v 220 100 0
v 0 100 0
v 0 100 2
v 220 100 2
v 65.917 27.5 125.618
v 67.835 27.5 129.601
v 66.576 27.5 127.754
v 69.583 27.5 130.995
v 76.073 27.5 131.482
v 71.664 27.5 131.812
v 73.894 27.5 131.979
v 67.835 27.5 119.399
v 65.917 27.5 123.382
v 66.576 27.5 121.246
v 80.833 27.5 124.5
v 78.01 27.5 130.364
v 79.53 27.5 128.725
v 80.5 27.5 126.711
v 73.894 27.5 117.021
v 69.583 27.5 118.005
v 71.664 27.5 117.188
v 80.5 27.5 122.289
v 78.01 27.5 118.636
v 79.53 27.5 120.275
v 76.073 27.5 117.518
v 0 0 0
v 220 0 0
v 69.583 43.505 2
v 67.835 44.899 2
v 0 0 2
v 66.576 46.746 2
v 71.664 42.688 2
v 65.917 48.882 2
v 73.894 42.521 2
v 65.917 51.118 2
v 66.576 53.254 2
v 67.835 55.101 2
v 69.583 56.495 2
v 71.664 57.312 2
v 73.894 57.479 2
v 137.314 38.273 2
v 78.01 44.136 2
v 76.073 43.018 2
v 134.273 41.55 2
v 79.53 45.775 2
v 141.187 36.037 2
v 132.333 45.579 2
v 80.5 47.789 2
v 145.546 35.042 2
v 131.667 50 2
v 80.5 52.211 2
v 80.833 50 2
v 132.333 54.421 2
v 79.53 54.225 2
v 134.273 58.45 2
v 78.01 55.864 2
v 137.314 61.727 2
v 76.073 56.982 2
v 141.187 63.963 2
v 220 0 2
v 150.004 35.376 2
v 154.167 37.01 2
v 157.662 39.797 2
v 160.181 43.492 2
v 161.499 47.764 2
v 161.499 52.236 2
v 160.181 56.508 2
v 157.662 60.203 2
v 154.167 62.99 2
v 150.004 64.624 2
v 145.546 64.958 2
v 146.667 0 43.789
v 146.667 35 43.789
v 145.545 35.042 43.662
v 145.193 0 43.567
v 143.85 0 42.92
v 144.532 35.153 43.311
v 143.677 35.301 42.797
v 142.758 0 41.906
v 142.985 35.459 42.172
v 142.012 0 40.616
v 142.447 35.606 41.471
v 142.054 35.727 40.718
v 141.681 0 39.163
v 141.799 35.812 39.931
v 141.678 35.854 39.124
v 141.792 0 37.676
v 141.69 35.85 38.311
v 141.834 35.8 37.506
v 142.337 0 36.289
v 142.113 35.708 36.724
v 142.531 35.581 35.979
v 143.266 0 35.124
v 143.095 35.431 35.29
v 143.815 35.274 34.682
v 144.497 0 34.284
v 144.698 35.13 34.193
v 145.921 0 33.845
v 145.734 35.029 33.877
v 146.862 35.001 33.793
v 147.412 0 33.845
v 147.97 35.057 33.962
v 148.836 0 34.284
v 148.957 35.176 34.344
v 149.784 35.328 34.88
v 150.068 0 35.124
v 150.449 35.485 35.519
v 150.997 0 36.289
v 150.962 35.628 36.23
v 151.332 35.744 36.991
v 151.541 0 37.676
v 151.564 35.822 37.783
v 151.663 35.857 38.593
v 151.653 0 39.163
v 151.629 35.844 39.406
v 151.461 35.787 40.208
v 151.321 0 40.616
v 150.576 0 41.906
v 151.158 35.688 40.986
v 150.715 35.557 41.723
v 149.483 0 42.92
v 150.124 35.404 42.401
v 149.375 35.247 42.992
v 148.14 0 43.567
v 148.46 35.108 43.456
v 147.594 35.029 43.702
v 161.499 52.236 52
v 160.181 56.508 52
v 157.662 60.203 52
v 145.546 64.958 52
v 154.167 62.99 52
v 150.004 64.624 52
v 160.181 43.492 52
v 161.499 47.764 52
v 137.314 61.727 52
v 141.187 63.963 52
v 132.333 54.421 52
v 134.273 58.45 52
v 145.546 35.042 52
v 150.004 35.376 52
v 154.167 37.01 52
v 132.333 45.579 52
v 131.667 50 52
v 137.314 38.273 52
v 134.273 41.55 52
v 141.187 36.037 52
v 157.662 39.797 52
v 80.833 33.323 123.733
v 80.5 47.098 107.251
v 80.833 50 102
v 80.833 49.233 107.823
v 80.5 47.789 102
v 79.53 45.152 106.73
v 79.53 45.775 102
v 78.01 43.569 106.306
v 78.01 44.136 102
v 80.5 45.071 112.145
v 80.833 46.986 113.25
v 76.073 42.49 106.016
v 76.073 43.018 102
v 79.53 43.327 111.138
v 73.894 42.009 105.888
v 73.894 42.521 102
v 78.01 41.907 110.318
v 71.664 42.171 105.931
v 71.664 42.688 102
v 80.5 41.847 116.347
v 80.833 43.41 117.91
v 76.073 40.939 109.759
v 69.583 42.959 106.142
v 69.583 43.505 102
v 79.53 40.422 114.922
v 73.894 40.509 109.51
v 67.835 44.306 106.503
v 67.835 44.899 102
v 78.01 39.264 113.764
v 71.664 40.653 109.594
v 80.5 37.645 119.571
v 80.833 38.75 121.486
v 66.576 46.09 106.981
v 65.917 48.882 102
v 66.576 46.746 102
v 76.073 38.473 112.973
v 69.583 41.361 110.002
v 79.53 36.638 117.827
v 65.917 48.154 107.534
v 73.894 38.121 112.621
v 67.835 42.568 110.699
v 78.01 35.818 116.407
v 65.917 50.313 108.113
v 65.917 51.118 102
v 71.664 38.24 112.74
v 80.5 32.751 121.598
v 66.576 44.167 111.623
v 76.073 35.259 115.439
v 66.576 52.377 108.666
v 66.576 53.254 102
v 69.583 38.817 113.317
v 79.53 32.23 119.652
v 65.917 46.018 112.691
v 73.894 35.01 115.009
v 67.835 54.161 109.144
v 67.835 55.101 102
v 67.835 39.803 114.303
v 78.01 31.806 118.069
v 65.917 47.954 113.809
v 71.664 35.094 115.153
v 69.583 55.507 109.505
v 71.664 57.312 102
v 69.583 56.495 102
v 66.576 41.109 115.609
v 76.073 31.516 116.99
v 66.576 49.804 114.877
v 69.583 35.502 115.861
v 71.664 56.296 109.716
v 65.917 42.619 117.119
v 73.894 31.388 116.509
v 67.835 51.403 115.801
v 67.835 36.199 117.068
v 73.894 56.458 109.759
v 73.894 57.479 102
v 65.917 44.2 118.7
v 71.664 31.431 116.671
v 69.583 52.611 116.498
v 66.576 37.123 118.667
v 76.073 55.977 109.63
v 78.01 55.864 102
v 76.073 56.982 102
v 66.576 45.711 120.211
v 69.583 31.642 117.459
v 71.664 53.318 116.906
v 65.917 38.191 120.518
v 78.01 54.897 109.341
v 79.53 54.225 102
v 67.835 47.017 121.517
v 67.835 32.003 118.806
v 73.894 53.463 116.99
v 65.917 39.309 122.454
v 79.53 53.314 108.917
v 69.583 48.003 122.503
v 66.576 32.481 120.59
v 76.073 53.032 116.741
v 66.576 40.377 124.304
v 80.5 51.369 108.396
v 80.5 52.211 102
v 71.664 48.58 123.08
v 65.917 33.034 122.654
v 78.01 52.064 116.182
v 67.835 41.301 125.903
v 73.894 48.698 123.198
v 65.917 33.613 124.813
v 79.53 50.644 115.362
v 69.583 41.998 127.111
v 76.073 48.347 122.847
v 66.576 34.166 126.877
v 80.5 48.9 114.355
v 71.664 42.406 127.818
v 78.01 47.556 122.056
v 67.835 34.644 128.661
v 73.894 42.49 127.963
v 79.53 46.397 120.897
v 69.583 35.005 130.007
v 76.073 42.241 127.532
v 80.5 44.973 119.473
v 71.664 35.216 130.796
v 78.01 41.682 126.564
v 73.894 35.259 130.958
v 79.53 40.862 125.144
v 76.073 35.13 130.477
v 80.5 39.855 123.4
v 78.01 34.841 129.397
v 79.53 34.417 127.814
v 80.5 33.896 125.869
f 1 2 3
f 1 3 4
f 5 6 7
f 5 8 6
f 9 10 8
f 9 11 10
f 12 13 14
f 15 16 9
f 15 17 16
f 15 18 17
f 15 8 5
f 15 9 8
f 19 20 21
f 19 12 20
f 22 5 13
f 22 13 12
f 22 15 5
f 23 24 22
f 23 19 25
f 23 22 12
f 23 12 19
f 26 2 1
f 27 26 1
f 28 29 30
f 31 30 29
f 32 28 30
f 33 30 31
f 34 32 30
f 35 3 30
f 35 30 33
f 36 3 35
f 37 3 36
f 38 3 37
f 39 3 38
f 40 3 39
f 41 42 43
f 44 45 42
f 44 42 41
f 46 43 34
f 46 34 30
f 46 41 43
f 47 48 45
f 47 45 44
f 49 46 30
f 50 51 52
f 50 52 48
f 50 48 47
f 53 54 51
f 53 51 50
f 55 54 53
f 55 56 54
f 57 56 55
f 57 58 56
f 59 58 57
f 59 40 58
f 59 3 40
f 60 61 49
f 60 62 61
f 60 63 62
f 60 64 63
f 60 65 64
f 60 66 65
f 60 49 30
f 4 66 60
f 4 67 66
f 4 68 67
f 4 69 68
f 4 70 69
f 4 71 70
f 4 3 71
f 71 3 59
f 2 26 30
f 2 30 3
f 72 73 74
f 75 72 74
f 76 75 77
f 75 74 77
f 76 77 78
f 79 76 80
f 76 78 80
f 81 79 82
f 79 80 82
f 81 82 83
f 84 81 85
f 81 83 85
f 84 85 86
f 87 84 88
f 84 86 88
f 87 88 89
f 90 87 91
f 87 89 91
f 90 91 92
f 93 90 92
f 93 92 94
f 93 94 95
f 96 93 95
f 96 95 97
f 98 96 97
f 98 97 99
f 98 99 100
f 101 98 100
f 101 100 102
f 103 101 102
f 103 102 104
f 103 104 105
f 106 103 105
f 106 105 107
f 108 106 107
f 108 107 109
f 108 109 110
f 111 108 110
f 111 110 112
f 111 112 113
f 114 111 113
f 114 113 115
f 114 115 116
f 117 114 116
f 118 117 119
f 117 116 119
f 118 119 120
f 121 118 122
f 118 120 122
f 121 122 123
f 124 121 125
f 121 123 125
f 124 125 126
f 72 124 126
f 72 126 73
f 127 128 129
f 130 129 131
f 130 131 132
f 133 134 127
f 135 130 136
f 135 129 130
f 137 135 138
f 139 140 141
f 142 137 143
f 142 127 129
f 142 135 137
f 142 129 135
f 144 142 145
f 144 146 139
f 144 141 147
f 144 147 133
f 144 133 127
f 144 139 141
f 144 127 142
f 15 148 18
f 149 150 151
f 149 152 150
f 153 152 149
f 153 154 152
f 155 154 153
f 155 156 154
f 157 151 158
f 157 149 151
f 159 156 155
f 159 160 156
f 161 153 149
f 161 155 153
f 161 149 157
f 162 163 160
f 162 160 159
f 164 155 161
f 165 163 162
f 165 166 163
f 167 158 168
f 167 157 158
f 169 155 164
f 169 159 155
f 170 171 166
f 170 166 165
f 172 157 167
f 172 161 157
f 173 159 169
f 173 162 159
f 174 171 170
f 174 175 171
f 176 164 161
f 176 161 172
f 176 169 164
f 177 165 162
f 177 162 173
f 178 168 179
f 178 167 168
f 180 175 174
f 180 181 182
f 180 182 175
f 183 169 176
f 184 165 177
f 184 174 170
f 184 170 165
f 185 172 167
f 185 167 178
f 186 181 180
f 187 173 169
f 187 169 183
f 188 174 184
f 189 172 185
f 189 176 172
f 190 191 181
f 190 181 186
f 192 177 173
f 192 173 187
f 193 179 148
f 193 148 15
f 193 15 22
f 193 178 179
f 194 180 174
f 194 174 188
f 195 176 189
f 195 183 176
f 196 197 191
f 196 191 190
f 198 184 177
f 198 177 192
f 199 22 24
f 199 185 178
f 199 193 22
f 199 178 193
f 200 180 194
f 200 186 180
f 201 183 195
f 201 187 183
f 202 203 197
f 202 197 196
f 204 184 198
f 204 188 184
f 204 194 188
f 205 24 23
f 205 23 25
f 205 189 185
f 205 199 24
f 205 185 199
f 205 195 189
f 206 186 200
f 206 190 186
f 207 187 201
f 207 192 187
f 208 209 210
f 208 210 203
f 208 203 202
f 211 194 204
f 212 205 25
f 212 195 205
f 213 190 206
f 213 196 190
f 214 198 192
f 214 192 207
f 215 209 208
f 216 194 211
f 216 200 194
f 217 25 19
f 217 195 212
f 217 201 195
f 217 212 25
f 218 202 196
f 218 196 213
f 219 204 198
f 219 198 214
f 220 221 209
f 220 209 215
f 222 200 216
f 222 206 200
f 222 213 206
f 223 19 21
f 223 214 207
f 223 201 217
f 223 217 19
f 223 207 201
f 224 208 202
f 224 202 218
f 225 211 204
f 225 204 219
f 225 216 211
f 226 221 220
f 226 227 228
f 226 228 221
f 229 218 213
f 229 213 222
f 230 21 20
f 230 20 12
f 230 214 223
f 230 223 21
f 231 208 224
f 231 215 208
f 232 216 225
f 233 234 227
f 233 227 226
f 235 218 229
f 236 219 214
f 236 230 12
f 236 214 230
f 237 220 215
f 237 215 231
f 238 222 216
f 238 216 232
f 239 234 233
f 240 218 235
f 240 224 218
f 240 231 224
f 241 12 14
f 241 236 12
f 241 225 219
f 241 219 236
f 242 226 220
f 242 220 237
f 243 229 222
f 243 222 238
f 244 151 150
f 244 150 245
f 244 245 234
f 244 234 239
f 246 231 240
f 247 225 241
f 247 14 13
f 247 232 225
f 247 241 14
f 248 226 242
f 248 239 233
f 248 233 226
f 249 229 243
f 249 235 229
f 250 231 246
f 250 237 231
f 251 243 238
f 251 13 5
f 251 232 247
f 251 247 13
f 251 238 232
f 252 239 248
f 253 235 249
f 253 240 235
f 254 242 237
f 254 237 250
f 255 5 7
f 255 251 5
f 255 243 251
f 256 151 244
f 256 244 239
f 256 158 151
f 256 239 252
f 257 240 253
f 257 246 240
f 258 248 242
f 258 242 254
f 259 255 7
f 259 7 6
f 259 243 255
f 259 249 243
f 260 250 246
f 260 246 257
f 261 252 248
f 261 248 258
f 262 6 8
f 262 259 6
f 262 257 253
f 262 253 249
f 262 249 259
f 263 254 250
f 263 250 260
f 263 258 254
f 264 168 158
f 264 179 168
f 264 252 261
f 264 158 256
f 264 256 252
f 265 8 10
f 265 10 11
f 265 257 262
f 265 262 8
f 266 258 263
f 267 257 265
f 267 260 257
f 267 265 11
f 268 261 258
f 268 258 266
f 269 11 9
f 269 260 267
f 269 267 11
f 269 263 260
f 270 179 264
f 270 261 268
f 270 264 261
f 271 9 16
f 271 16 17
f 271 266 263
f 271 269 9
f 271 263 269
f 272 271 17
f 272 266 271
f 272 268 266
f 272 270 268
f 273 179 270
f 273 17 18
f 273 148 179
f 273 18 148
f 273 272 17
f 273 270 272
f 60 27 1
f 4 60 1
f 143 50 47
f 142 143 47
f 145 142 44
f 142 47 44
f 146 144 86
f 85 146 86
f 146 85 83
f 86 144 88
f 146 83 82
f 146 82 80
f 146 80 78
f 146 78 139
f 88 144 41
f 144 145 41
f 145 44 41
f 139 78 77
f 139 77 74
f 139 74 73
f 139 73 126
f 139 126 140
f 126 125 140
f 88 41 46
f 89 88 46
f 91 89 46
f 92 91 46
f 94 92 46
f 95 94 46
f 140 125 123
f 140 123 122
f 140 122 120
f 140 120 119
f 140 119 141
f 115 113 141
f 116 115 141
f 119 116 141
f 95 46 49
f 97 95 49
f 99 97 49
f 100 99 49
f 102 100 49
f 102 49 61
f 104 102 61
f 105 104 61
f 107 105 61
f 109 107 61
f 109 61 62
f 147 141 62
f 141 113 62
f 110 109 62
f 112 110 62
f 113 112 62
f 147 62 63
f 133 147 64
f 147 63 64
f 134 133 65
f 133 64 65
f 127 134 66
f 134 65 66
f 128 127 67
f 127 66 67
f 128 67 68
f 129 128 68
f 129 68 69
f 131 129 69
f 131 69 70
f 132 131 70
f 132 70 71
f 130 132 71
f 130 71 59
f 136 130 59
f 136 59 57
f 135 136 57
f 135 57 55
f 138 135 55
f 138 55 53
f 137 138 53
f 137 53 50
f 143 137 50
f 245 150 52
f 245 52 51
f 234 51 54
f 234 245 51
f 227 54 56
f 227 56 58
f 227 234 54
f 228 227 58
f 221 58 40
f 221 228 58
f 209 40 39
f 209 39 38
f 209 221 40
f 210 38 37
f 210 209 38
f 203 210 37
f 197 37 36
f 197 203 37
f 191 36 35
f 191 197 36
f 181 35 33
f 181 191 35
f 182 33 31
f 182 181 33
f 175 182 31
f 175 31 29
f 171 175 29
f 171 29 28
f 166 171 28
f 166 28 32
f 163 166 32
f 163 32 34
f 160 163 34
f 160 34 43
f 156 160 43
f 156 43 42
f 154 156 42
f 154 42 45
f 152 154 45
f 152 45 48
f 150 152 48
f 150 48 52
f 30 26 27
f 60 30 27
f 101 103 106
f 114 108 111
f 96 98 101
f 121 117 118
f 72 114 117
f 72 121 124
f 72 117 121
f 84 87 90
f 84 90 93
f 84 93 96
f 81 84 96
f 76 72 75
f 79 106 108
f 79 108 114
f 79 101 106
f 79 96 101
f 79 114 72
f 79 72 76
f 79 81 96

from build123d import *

# Parameters (mm, degrees)
SKETCH_1_W        = 220
SKETCH_1_H        = 100
EXTRUDE_1_DEPTH   = 2
SWEEP_1_PROFILE_R = 7.5
SKETCH_15_R       = 15
EXTRUDE_2_DEPTH   = 50
SKETCH_16_R       = 5
EXTRUDE_3_DEPTH   = 50


with BuildPart() as part:
    # Эскиз1 → Бобышка-Вытянуть1 (new body)
    with BuildSketch(Plane.XY):
        with Locations((110, 50)):
            Rectangle(SKETCH_1_W, SKETCH_1_H)
    extrude(amount=EXTRUDE_1_DEPTH)

    # По траектории1: sweep along a curve in space
    with BuildLine() as sweep_1_path:
        Line((73.333333333, 50, 2), (73.333333333, 50, 102))
        ThreePointArc((73.333333333, 50, 102), (73.333333333, 43.409902577, 117.909902577), (73.333333333, 27.5, 124.5))
    # По траектории1 profile (on start of the path) → По траектории1 (sweep)
    with BuildSketch(Plane(origin=(73.333333333, 50, 2), x_dir=(1, 0, 0), z_dir=(0, 0, 1))):
        Circle(SWEEP_1_PROFILE_R)
    sweep(path=sweep_1_path.line)

    # Эскиз15 → Бобышка-Вытянуть2 (add)
    with BuildSketch(Plane.XY.offset(2)):
        with Locations(Location((146.666666667, 50, 0), (0, 0, 180))):
            Circle(SKETCH_15_R)
    extrude(amount=EXTRUDE_2_DEPTH)

    # Эскиз16 → Бобышка-Вытянуть3 (add)
    with BuildSketch(Plane(origin=(0, 50, 0), x_dir=(-1, 0, 0), z_dir=(0, -1, 0))):
        with Locations(Location((-146.666666667, -38.788976591, 0), (0, 0, 270))):
            Circle(SKETCH_16_R)
    extrude(amount=EXTRUDE_3_DEPTH)


solid = part.part
